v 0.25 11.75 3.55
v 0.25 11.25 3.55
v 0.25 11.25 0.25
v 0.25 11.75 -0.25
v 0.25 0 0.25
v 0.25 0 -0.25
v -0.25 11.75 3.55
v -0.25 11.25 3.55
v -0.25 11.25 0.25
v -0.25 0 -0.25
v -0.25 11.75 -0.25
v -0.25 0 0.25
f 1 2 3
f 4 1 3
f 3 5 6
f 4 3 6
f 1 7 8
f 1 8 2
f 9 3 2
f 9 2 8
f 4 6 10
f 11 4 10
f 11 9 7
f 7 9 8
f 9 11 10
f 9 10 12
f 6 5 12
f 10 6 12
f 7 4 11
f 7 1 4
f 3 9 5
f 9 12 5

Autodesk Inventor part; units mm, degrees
ref_plane "YZ Plane" through (0, 0, 0) normal (1, 0, 0) x (0, 1, 0)
ref_plane "XZ Plane" through (0, 0, 0) normal (0, 1, 0) x (-1, 0, 0)
ref_plane "XY Plane" through (0, 0, 0) normal (0, 0, 1) x (1, 0, 0)
sketch "Sketch1" plane through (0, 0, 0) normal (0, 1, 0) x (-1, 0, 0)
  line L0 (0.25, 0.25) -> (-0.25, 0.25)
  line L1 (-0.25, 0.25) -> (-0.25, -0.25)
  line L2 (-0.25, -0.25) -> (0.25, -0.25)
  line L3 (0.25, -0.25) -> (0.25, 0.25)
  line L4 (0.25, 0.25) -> (-0.25, -0.25) construction
  line L5 (-0.25, 0.25) -> (0.25, -0.25) construction
  point P0 (0, 0)
  dimension "d0" = 0.5
  dimension "d1" = 0.5
extrude "Extrusion1" add sketch "Sketch1" along normal blind 11.75
sketch "Sketch2" plane through (-0.25, 0, 0.25) normal (0, 0, 1) x (1, 0, 0)
  line L0 (0, 0) -> (0.5, 0) projected
  line L1 (0.5, 0) -> (0.5, 11.75) projected
  line L2 (0, 11.75) -> (0.5, 11.75) projected
  line L3 (0, 0) -> (0, 11.75) projected
  line L4 (0, 11.75) -> (0.5, 11.75)
  line L5 (0.5, 11.75) -> (0.5, 11.25)
  line L6 (0.5, 11.25) -> (0, 11.25)
  line L7 (0, 11.25) -> (0, 11.75)
  point P0 (0.25, 0)
  point P1 (0, 11.25)
  dimension "d10" = 0.5
extrude "Extrusion2" add sketch "Sketch2" along normal blind 3.3 contours L3 L2 L1 L6
properties part number "switch-wire"
